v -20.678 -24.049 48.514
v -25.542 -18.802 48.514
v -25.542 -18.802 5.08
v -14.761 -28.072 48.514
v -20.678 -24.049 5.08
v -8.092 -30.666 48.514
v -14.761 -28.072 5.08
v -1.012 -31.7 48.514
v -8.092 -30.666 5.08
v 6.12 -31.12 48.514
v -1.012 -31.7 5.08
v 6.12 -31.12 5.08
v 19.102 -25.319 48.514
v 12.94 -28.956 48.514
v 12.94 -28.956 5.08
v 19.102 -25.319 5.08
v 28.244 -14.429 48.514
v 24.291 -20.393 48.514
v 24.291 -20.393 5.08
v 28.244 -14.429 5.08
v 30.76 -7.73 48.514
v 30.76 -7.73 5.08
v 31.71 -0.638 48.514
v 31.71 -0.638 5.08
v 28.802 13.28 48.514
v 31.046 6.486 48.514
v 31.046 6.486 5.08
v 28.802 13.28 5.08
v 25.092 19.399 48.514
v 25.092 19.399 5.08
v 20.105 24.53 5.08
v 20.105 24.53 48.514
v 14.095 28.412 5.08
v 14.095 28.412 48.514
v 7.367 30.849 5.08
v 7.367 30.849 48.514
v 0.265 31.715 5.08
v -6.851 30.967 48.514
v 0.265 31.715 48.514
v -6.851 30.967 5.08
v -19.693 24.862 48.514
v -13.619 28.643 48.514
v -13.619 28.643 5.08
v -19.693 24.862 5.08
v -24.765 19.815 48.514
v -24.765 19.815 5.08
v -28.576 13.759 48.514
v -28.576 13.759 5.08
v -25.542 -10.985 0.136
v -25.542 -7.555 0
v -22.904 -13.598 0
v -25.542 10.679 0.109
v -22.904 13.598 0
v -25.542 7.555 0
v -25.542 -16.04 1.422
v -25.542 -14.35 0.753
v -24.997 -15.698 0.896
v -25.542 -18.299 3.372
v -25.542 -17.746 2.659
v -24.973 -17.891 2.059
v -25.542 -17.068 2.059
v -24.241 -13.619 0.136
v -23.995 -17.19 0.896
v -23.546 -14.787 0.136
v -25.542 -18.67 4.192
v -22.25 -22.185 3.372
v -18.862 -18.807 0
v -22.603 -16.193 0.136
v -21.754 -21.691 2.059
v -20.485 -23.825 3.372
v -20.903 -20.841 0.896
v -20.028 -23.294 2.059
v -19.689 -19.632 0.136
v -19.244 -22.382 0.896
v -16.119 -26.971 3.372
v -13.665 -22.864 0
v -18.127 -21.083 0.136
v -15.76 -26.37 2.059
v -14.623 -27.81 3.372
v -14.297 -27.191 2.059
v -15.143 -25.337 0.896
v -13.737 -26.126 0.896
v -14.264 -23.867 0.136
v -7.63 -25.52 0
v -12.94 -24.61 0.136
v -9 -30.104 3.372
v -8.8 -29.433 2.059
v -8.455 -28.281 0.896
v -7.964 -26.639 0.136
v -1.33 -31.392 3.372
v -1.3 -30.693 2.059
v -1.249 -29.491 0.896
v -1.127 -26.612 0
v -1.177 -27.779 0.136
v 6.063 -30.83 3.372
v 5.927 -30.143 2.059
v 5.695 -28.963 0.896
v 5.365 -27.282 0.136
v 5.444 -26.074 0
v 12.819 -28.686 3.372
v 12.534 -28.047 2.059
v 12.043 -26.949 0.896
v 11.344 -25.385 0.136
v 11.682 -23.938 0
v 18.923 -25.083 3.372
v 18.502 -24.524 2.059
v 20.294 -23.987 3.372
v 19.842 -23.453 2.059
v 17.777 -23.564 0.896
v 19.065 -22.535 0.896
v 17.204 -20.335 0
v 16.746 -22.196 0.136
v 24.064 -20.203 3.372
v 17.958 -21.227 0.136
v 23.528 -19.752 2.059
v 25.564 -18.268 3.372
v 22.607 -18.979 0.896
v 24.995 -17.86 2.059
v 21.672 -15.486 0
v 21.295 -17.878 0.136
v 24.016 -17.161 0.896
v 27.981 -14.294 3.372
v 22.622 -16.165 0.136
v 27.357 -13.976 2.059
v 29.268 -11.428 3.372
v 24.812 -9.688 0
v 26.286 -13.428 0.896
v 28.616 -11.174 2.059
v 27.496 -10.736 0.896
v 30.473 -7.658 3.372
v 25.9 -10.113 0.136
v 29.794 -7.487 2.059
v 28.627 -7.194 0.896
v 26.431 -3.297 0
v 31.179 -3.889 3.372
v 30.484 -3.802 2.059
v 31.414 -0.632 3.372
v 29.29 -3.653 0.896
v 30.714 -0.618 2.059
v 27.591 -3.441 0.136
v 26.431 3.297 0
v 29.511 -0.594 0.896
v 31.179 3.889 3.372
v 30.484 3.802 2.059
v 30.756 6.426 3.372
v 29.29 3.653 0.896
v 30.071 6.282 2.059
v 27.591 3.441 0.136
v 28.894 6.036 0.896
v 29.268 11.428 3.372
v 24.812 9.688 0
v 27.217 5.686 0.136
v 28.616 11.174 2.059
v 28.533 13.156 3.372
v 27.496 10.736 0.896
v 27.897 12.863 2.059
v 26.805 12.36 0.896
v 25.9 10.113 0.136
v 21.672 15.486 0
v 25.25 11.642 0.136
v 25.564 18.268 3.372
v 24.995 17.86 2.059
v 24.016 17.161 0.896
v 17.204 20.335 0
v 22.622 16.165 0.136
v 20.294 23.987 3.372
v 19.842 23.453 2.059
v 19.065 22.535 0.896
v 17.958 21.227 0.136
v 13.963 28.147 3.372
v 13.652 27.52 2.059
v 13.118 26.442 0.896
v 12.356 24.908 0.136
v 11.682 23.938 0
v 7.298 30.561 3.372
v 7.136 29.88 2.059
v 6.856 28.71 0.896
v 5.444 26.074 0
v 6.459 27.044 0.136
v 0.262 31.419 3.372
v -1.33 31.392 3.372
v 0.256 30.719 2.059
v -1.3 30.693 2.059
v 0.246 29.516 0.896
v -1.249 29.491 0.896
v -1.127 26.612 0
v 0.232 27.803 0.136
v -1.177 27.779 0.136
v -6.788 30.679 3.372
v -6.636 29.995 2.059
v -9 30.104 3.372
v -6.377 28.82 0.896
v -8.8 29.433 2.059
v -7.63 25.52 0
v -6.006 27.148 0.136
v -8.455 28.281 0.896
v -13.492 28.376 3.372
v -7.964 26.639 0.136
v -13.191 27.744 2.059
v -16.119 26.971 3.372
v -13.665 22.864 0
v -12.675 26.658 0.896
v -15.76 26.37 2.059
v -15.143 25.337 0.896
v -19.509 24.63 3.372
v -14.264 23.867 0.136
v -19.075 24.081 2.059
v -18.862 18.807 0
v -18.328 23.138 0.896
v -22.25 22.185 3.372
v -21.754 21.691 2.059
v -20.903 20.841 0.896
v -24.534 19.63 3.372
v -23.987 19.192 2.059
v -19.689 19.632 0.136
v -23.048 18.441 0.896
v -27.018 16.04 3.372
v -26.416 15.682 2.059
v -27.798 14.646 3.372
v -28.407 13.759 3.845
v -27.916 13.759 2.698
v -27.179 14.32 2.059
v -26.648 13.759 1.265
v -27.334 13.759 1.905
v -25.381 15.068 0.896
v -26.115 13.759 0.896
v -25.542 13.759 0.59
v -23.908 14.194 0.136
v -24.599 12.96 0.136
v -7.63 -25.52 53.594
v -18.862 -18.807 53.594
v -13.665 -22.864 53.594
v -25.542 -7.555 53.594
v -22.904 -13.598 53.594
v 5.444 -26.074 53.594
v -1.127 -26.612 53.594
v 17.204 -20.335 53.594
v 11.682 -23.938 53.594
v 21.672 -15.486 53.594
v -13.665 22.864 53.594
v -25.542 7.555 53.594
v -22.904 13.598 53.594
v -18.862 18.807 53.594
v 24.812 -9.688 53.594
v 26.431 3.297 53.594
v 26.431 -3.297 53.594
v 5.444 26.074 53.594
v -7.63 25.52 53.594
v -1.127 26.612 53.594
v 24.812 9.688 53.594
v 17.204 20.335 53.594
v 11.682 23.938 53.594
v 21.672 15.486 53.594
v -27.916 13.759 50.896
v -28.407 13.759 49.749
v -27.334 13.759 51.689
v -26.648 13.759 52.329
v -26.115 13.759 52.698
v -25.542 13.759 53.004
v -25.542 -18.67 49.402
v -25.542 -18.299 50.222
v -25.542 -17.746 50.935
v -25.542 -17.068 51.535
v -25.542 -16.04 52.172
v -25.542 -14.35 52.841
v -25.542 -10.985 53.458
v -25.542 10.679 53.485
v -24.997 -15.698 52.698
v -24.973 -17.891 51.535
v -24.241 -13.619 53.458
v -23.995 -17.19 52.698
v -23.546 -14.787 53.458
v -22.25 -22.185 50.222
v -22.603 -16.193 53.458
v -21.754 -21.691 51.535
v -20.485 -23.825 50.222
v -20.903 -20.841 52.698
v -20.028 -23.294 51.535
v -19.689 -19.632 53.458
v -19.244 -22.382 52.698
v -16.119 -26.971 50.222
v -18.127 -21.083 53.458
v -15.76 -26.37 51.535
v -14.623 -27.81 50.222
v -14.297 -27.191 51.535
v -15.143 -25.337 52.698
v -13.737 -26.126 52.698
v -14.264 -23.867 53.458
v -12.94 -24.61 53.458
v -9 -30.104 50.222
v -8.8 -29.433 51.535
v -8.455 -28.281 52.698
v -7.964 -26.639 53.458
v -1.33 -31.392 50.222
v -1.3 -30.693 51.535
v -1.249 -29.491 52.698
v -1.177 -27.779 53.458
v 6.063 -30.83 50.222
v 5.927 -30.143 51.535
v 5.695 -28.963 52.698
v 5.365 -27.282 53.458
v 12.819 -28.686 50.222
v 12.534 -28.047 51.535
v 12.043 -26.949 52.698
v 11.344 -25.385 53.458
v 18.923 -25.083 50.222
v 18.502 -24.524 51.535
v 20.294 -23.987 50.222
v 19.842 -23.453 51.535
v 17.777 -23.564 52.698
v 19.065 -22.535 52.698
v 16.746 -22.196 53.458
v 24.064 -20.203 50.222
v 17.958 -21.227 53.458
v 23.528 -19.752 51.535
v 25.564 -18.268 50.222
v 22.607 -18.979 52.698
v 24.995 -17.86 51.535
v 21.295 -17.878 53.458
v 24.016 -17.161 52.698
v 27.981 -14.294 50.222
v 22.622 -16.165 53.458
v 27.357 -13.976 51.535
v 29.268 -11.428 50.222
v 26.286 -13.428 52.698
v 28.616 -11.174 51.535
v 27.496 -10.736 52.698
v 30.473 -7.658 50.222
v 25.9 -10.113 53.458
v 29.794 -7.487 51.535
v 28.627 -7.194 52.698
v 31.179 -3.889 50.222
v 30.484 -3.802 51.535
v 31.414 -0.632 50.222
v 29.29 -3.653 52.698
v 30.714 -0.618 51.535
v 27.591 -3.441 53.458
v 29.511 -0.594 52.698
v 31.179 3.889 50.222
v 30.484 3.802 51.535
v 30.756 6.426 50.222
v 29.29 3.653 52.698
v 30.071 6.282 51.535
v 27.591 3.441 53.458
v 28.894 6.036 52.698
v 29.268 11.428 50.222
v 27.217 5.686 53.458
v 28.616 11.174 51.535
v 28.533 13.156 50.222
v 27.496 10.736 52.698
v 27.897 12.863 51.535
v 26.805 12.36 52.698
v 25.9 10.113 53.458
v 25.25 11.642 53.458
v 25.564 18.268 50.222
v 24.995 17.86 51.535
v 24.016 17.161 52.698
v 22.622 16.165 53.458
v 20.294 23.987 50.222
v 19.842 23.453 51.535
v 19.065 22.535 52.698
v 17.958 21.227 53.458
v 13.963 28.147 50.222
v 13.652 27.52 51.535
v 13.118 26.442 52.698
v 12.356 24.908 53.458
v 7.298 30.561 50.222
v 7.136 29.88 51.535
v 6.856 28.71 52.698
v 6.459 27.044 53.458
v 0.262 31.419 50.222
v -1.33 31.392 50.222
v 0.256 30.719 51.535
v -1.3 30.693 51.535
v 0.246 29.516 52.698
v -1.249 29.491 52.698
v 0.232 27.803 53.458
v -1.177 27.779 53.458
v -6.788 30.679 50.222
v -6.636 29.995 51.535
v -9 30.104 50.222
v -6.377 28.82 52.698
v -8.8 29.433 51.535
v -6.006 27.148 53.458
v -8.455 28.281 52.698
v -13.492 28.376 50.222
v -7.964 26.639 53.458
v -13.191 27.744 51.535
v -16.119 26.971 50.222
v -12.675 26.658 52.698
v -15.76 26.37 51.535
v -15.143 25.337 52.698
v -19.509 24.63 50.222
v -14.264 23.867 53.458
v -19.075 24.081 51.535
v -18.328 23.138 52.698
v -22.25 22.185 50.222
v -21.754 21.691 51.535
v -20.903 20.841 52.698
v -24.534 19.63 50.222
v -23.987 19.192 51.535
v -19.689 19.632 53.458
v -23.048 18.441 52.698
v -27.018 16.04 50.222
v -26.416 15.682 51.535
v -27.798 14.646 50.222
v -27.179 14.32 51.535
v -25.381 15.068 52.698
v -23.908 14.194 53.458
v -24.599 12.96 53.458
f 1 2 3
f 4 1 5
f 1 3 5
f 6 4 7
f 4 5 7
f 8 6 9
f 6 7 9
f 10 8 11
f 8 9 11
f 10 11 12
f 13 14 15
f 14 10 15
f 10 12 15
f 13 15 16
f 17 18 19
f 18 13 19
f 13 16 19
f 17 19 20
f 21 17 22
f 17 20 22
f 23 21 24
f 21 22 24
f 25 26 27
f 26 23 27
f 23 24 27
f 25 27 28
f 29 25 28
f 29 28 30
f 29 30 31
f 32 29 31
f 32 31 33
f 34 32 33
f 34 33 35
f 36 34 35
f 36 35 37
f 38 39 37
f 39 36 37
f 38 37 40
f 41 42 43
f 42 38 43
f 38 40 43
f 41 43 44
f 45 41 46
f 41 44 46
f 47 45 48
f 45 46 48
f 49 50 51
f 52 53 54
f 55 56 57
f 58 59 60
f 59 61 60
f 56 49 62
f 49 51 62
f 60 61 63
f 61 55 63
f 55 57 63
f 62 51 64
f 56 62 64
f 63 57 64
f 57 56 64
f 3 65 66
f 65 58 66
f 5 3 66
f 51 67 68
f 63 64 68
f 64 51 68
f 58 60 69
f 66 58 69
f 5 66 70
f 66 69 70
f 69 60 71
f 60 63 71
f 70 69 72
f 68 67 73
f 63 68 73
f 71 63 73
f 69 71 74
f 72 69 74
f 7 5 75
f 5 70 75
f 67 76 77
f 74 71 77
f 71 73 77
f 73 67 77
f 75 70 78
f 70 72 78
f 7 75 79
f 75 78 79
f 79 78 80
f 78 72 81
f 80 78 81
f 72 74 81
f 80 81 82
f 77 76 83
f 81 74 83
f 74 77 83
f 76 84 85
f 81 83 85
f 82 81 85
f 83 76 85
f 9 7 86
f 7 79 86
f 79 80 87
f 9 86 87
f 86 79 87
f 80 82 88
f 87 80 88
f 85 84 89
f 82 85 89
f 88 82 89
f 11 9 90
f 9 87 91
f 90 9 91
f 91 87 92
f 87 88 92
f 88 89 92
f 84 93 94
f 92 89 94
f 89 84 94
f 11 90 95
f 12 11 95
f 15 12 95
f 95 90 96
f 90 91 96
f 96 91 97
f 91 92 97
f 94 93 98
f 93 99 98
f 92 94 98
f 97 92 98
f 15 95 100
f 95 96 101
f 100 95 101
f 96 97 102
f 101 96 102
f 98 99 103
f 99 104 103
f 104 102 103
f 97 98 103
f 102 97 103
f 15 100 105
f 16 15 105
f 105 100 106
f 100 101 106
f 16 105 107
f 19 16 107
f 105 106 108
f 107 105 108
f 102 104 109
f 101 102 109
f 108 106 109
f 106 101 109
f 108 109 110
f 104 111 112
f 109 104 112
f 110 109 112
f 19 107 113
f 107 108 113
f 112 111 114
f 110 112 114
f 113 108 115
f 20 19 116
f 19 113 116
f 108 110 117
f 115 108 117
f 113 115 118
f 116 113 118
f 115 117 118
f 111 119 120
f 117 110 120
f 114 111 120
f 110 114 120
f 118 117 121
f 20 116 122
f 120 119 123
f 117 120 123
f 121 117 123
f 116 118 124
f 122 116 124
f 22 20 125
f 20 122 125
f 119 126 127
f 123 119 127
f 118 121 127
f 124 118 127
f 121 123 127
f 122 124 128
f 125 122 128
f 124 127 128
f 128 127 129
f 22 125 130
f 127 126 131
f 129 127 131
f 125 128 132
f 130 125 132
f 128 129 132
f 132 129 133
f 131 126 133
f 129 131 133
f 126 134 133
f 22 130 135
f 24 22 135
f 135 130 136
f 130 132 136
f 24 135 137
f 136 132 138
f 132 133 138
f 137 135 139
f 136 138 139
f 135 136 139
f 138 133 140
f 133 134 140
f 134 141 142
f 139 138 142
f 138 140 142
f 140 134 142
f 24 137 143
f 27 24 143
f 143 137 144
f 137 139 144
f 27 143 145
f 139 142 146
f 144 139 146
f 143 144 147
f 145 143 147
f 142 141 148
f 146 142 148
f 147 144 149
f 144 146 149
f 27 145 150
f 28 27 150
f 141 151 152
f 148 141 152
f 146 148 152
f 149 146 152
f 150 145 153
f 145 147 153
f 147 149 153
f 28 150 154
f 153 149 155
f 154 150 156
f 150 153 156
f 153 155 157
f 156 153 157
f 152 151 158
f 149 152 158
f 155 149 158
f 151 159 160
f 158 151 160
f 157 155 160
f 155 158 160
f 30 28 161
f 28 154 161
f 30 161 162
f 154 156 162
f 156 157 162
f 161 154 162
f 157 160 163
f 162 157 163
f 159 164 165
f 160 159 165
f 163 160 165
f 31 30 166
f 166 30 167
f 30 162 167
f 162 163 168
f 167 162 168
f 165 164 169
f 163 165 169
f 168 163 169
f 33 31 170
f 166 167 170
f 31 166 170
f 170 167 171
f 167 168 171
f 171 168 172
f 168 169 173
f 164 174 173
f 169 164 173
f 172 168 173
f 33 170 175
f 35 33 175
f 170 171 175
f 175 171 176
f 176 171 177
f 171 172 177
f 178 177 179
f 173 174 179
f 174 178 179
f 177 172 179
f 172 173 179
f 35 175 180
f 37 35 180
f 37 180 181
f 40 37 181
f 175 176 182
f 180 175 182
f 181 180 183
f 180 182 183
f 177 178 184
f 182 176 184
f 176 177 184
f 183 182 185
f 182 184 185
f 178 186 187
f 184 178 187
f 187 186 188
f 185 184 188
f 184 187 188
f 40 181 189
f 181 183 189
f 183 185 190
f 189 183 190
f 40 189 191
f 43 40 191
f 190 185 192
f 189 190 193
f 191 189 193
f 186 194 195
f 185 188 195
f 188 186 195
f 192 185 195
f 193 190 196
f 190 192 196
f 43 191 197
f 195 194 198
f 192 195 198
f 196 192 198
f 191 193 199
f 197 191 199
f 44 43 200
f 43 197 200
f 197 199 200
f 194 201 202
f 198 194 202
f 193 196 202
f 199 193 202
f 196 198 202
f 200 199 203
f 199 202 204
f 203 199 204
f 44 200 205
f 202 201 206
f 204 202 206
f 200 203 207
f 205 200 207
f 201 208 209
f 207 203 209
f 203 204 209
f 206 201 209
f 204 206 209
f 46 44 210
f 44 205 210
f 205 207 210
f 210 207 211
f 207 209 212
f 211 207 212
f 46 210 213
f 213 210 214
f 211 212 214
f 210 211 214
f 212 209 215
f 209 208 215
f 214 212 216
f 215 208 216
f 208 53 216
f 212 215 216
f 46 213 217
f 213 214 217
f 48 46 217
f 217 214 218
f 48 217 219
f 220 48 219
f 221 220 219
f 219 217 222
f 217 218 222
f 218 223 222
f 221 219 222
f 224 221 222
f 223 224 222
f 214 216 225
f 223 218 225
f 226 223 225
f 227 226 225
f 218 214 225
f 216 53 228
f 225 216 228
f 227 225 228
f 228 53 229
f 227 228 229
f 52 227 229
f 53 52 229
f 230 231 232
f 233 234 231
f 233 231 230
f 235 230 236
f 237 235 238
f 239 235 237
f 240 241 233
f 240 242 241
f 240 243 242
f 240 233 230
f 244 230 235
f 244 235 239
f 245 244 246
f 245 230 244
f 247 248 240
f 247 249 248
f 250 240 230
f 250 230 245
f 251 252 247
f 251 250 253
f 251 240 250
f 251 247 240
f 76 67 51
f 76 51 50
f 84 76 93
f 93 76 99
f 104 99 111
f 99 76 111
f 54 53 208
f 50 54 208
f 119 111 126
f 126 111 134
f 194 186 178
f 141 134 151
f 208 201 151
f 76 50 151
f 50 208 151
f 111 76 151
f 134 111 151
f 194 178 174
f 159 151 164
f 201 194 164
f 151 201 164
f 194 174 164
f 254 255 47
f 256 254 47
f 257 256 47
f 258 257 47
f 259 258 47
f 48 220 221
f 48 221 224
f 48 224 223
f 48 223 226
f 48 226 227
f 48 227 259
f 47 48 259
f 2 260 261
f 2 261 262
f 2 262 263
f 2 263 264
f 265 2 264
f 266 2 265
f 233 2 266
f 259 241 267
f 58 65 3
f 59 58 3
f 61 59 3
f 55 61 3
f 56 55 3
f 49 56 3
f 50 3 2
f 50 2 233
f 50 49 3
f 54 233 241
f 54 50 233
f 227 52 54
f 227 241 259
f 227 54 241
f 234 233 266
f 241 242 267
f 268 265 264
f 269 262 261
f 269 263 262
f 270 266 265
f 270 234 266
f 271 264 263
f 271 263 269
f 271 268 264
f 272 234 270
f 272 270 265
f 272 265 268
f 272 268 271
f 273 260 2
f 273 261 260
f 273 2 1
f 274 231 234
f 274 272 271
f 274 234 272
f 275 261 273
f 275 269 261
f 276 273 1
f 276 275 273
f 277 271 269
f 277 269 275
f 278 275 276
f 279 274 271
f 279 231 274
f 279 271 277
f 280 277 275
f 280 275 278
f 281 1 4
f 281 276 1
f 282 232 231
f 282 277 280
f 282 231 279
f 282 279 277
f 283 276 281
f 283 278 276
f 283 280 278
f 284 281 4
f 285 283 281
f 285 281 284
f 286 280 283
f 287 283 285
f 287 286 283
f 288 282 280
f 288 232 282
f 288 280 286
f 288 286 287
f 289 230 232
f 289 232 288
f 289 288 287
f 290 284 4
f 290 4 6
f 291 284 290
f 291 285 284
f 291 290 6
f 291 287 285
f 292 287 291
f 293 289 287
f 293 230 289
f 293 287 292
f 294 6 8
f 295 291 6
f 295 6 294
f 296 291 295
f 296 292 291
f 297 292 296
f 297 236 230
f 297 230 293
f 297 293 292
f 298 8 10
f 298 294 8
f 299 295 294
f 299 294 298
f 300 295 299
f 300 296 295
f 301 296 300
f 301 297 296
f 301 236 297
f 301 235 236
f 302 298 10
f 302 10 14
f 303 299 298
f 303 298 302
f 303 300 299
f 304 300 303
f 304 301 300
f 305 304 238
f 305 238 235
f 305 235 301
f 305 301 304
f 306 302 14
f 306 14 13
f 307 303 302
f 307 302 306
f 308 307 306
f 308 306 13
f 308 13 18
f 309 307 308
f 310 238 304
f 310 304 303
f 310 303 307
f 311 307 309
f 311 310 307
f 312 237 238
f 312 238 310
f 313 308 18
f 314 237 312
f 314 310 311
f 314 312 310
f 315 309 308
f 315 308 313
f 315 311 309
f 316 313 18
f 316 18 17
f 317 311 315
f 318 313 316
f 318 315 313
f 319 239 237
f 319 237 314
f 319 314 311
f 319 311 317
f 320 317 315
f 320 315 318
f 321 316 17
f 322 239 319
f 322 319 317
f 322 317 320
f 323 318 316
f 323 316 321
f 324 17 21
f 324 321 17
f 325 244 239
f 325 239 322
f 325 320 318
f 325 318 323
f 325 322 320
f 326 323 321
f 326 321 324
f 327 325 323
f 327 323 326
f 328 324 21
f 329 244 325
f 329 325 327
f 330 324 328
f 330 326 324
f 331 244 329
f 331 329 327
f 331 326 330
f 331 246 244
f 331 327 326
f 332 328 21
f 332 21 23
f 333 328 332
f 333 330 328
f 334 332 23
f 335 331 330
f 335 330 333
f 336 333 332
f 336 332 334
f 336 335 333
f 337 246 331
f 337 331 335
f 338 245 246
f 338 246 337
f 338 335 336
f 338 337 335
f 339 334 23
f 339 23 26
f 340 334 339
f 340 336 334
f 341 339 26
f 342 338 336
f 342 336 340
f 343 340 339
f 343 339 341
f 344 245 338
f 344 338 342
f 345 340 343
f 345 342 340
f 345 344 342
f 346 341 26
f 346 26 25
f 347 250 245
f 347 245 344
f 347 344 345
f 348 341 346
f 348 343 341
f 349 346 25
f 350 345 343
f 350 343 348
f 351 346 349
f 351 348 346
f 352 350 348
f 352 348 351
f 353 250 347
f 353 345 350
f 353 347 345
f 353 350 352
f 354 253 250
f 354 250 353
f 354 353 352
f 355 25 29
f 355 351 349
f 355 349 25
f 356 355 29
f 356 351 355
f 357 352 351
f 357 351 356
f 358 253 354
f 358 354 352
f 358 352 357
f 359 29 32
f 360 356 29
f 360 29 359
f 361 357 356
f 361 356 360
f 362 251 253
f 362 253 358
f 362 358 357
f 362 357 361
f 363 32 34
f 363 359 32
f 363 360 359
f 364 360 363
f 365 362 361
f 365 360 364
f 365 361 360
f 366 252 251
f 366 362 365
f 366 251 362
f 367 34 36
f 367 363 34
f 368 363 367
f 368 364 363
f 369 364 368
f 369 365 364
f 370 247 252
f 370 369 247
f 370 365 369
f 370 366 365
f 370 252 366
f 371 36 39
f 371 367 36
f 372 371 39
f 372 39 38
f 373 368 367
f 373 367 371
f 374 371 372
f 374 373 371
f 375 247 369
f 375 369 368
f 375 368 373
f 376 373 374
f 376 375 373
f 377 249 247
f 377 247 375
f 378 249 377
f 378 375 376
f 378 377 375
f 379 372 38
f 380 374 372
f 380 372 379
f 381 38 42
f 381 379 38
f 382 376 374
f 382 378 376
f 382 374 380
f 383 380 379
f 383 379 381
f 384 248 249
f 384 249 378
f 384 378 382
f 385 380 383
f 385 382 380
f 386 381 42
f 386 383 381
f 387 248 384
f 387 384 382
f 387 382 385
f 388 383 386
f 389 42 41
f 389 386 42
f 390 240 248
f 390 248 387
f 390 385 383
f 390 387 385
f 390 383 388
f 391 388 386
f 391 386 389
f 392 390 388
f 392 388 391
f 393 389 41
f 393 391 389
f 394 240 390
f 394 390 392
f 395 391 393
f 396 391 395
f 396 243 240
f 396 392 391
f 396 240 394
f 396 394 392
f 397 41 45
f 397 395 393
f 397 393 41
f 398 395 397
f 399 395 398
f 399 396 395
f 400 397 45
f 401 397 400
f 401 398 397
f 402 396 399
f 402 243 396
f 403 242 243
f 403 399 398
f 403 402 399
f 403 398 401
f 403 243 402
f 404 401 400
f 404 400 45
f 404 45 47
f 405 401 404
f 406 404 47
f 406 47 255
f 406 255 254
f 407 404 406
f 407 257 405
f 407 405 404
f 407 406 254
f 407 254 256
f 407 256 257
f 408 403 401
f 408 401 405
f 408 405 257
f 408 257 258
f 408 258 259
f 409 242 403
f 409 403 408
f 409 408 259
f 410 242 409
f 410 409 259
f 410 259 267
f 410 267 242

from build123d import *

# Parameters (mm, degrees)
F0_R     = 31.716166
F1_DEPTH = 53.594
F2_R     = 5.08
F3_W     = 40.479297
F3_H     = 50.922095
F4_DEPTH = 132.588


with BuildPart() as f1:
    # F0 (on Top) → F1 (new body)
    with BuildSketch(Plane.XY):
        Circle(F0_R)
    extrude(amount=F1_DEPTH)

    # F2
    f2_edges = [f1.edges().sort_by_distance(p)[0] for p in [
        (-31.716166, 0, 53.594),
        (-31.716166, 0, 0),
    ]]
    fillet(f2_edges, radius=F2_R)

    # F3 (on Top) → F4 (cut)
    with BuildSketch(Plane.XY):
        with Locations((-45.781928, -11.702132)):
            Rectangle(F3_W, F3_H)
    extrude(amount=F4_DEPTH, mode=Mode.SUBTRACT)


solid = f1.part
